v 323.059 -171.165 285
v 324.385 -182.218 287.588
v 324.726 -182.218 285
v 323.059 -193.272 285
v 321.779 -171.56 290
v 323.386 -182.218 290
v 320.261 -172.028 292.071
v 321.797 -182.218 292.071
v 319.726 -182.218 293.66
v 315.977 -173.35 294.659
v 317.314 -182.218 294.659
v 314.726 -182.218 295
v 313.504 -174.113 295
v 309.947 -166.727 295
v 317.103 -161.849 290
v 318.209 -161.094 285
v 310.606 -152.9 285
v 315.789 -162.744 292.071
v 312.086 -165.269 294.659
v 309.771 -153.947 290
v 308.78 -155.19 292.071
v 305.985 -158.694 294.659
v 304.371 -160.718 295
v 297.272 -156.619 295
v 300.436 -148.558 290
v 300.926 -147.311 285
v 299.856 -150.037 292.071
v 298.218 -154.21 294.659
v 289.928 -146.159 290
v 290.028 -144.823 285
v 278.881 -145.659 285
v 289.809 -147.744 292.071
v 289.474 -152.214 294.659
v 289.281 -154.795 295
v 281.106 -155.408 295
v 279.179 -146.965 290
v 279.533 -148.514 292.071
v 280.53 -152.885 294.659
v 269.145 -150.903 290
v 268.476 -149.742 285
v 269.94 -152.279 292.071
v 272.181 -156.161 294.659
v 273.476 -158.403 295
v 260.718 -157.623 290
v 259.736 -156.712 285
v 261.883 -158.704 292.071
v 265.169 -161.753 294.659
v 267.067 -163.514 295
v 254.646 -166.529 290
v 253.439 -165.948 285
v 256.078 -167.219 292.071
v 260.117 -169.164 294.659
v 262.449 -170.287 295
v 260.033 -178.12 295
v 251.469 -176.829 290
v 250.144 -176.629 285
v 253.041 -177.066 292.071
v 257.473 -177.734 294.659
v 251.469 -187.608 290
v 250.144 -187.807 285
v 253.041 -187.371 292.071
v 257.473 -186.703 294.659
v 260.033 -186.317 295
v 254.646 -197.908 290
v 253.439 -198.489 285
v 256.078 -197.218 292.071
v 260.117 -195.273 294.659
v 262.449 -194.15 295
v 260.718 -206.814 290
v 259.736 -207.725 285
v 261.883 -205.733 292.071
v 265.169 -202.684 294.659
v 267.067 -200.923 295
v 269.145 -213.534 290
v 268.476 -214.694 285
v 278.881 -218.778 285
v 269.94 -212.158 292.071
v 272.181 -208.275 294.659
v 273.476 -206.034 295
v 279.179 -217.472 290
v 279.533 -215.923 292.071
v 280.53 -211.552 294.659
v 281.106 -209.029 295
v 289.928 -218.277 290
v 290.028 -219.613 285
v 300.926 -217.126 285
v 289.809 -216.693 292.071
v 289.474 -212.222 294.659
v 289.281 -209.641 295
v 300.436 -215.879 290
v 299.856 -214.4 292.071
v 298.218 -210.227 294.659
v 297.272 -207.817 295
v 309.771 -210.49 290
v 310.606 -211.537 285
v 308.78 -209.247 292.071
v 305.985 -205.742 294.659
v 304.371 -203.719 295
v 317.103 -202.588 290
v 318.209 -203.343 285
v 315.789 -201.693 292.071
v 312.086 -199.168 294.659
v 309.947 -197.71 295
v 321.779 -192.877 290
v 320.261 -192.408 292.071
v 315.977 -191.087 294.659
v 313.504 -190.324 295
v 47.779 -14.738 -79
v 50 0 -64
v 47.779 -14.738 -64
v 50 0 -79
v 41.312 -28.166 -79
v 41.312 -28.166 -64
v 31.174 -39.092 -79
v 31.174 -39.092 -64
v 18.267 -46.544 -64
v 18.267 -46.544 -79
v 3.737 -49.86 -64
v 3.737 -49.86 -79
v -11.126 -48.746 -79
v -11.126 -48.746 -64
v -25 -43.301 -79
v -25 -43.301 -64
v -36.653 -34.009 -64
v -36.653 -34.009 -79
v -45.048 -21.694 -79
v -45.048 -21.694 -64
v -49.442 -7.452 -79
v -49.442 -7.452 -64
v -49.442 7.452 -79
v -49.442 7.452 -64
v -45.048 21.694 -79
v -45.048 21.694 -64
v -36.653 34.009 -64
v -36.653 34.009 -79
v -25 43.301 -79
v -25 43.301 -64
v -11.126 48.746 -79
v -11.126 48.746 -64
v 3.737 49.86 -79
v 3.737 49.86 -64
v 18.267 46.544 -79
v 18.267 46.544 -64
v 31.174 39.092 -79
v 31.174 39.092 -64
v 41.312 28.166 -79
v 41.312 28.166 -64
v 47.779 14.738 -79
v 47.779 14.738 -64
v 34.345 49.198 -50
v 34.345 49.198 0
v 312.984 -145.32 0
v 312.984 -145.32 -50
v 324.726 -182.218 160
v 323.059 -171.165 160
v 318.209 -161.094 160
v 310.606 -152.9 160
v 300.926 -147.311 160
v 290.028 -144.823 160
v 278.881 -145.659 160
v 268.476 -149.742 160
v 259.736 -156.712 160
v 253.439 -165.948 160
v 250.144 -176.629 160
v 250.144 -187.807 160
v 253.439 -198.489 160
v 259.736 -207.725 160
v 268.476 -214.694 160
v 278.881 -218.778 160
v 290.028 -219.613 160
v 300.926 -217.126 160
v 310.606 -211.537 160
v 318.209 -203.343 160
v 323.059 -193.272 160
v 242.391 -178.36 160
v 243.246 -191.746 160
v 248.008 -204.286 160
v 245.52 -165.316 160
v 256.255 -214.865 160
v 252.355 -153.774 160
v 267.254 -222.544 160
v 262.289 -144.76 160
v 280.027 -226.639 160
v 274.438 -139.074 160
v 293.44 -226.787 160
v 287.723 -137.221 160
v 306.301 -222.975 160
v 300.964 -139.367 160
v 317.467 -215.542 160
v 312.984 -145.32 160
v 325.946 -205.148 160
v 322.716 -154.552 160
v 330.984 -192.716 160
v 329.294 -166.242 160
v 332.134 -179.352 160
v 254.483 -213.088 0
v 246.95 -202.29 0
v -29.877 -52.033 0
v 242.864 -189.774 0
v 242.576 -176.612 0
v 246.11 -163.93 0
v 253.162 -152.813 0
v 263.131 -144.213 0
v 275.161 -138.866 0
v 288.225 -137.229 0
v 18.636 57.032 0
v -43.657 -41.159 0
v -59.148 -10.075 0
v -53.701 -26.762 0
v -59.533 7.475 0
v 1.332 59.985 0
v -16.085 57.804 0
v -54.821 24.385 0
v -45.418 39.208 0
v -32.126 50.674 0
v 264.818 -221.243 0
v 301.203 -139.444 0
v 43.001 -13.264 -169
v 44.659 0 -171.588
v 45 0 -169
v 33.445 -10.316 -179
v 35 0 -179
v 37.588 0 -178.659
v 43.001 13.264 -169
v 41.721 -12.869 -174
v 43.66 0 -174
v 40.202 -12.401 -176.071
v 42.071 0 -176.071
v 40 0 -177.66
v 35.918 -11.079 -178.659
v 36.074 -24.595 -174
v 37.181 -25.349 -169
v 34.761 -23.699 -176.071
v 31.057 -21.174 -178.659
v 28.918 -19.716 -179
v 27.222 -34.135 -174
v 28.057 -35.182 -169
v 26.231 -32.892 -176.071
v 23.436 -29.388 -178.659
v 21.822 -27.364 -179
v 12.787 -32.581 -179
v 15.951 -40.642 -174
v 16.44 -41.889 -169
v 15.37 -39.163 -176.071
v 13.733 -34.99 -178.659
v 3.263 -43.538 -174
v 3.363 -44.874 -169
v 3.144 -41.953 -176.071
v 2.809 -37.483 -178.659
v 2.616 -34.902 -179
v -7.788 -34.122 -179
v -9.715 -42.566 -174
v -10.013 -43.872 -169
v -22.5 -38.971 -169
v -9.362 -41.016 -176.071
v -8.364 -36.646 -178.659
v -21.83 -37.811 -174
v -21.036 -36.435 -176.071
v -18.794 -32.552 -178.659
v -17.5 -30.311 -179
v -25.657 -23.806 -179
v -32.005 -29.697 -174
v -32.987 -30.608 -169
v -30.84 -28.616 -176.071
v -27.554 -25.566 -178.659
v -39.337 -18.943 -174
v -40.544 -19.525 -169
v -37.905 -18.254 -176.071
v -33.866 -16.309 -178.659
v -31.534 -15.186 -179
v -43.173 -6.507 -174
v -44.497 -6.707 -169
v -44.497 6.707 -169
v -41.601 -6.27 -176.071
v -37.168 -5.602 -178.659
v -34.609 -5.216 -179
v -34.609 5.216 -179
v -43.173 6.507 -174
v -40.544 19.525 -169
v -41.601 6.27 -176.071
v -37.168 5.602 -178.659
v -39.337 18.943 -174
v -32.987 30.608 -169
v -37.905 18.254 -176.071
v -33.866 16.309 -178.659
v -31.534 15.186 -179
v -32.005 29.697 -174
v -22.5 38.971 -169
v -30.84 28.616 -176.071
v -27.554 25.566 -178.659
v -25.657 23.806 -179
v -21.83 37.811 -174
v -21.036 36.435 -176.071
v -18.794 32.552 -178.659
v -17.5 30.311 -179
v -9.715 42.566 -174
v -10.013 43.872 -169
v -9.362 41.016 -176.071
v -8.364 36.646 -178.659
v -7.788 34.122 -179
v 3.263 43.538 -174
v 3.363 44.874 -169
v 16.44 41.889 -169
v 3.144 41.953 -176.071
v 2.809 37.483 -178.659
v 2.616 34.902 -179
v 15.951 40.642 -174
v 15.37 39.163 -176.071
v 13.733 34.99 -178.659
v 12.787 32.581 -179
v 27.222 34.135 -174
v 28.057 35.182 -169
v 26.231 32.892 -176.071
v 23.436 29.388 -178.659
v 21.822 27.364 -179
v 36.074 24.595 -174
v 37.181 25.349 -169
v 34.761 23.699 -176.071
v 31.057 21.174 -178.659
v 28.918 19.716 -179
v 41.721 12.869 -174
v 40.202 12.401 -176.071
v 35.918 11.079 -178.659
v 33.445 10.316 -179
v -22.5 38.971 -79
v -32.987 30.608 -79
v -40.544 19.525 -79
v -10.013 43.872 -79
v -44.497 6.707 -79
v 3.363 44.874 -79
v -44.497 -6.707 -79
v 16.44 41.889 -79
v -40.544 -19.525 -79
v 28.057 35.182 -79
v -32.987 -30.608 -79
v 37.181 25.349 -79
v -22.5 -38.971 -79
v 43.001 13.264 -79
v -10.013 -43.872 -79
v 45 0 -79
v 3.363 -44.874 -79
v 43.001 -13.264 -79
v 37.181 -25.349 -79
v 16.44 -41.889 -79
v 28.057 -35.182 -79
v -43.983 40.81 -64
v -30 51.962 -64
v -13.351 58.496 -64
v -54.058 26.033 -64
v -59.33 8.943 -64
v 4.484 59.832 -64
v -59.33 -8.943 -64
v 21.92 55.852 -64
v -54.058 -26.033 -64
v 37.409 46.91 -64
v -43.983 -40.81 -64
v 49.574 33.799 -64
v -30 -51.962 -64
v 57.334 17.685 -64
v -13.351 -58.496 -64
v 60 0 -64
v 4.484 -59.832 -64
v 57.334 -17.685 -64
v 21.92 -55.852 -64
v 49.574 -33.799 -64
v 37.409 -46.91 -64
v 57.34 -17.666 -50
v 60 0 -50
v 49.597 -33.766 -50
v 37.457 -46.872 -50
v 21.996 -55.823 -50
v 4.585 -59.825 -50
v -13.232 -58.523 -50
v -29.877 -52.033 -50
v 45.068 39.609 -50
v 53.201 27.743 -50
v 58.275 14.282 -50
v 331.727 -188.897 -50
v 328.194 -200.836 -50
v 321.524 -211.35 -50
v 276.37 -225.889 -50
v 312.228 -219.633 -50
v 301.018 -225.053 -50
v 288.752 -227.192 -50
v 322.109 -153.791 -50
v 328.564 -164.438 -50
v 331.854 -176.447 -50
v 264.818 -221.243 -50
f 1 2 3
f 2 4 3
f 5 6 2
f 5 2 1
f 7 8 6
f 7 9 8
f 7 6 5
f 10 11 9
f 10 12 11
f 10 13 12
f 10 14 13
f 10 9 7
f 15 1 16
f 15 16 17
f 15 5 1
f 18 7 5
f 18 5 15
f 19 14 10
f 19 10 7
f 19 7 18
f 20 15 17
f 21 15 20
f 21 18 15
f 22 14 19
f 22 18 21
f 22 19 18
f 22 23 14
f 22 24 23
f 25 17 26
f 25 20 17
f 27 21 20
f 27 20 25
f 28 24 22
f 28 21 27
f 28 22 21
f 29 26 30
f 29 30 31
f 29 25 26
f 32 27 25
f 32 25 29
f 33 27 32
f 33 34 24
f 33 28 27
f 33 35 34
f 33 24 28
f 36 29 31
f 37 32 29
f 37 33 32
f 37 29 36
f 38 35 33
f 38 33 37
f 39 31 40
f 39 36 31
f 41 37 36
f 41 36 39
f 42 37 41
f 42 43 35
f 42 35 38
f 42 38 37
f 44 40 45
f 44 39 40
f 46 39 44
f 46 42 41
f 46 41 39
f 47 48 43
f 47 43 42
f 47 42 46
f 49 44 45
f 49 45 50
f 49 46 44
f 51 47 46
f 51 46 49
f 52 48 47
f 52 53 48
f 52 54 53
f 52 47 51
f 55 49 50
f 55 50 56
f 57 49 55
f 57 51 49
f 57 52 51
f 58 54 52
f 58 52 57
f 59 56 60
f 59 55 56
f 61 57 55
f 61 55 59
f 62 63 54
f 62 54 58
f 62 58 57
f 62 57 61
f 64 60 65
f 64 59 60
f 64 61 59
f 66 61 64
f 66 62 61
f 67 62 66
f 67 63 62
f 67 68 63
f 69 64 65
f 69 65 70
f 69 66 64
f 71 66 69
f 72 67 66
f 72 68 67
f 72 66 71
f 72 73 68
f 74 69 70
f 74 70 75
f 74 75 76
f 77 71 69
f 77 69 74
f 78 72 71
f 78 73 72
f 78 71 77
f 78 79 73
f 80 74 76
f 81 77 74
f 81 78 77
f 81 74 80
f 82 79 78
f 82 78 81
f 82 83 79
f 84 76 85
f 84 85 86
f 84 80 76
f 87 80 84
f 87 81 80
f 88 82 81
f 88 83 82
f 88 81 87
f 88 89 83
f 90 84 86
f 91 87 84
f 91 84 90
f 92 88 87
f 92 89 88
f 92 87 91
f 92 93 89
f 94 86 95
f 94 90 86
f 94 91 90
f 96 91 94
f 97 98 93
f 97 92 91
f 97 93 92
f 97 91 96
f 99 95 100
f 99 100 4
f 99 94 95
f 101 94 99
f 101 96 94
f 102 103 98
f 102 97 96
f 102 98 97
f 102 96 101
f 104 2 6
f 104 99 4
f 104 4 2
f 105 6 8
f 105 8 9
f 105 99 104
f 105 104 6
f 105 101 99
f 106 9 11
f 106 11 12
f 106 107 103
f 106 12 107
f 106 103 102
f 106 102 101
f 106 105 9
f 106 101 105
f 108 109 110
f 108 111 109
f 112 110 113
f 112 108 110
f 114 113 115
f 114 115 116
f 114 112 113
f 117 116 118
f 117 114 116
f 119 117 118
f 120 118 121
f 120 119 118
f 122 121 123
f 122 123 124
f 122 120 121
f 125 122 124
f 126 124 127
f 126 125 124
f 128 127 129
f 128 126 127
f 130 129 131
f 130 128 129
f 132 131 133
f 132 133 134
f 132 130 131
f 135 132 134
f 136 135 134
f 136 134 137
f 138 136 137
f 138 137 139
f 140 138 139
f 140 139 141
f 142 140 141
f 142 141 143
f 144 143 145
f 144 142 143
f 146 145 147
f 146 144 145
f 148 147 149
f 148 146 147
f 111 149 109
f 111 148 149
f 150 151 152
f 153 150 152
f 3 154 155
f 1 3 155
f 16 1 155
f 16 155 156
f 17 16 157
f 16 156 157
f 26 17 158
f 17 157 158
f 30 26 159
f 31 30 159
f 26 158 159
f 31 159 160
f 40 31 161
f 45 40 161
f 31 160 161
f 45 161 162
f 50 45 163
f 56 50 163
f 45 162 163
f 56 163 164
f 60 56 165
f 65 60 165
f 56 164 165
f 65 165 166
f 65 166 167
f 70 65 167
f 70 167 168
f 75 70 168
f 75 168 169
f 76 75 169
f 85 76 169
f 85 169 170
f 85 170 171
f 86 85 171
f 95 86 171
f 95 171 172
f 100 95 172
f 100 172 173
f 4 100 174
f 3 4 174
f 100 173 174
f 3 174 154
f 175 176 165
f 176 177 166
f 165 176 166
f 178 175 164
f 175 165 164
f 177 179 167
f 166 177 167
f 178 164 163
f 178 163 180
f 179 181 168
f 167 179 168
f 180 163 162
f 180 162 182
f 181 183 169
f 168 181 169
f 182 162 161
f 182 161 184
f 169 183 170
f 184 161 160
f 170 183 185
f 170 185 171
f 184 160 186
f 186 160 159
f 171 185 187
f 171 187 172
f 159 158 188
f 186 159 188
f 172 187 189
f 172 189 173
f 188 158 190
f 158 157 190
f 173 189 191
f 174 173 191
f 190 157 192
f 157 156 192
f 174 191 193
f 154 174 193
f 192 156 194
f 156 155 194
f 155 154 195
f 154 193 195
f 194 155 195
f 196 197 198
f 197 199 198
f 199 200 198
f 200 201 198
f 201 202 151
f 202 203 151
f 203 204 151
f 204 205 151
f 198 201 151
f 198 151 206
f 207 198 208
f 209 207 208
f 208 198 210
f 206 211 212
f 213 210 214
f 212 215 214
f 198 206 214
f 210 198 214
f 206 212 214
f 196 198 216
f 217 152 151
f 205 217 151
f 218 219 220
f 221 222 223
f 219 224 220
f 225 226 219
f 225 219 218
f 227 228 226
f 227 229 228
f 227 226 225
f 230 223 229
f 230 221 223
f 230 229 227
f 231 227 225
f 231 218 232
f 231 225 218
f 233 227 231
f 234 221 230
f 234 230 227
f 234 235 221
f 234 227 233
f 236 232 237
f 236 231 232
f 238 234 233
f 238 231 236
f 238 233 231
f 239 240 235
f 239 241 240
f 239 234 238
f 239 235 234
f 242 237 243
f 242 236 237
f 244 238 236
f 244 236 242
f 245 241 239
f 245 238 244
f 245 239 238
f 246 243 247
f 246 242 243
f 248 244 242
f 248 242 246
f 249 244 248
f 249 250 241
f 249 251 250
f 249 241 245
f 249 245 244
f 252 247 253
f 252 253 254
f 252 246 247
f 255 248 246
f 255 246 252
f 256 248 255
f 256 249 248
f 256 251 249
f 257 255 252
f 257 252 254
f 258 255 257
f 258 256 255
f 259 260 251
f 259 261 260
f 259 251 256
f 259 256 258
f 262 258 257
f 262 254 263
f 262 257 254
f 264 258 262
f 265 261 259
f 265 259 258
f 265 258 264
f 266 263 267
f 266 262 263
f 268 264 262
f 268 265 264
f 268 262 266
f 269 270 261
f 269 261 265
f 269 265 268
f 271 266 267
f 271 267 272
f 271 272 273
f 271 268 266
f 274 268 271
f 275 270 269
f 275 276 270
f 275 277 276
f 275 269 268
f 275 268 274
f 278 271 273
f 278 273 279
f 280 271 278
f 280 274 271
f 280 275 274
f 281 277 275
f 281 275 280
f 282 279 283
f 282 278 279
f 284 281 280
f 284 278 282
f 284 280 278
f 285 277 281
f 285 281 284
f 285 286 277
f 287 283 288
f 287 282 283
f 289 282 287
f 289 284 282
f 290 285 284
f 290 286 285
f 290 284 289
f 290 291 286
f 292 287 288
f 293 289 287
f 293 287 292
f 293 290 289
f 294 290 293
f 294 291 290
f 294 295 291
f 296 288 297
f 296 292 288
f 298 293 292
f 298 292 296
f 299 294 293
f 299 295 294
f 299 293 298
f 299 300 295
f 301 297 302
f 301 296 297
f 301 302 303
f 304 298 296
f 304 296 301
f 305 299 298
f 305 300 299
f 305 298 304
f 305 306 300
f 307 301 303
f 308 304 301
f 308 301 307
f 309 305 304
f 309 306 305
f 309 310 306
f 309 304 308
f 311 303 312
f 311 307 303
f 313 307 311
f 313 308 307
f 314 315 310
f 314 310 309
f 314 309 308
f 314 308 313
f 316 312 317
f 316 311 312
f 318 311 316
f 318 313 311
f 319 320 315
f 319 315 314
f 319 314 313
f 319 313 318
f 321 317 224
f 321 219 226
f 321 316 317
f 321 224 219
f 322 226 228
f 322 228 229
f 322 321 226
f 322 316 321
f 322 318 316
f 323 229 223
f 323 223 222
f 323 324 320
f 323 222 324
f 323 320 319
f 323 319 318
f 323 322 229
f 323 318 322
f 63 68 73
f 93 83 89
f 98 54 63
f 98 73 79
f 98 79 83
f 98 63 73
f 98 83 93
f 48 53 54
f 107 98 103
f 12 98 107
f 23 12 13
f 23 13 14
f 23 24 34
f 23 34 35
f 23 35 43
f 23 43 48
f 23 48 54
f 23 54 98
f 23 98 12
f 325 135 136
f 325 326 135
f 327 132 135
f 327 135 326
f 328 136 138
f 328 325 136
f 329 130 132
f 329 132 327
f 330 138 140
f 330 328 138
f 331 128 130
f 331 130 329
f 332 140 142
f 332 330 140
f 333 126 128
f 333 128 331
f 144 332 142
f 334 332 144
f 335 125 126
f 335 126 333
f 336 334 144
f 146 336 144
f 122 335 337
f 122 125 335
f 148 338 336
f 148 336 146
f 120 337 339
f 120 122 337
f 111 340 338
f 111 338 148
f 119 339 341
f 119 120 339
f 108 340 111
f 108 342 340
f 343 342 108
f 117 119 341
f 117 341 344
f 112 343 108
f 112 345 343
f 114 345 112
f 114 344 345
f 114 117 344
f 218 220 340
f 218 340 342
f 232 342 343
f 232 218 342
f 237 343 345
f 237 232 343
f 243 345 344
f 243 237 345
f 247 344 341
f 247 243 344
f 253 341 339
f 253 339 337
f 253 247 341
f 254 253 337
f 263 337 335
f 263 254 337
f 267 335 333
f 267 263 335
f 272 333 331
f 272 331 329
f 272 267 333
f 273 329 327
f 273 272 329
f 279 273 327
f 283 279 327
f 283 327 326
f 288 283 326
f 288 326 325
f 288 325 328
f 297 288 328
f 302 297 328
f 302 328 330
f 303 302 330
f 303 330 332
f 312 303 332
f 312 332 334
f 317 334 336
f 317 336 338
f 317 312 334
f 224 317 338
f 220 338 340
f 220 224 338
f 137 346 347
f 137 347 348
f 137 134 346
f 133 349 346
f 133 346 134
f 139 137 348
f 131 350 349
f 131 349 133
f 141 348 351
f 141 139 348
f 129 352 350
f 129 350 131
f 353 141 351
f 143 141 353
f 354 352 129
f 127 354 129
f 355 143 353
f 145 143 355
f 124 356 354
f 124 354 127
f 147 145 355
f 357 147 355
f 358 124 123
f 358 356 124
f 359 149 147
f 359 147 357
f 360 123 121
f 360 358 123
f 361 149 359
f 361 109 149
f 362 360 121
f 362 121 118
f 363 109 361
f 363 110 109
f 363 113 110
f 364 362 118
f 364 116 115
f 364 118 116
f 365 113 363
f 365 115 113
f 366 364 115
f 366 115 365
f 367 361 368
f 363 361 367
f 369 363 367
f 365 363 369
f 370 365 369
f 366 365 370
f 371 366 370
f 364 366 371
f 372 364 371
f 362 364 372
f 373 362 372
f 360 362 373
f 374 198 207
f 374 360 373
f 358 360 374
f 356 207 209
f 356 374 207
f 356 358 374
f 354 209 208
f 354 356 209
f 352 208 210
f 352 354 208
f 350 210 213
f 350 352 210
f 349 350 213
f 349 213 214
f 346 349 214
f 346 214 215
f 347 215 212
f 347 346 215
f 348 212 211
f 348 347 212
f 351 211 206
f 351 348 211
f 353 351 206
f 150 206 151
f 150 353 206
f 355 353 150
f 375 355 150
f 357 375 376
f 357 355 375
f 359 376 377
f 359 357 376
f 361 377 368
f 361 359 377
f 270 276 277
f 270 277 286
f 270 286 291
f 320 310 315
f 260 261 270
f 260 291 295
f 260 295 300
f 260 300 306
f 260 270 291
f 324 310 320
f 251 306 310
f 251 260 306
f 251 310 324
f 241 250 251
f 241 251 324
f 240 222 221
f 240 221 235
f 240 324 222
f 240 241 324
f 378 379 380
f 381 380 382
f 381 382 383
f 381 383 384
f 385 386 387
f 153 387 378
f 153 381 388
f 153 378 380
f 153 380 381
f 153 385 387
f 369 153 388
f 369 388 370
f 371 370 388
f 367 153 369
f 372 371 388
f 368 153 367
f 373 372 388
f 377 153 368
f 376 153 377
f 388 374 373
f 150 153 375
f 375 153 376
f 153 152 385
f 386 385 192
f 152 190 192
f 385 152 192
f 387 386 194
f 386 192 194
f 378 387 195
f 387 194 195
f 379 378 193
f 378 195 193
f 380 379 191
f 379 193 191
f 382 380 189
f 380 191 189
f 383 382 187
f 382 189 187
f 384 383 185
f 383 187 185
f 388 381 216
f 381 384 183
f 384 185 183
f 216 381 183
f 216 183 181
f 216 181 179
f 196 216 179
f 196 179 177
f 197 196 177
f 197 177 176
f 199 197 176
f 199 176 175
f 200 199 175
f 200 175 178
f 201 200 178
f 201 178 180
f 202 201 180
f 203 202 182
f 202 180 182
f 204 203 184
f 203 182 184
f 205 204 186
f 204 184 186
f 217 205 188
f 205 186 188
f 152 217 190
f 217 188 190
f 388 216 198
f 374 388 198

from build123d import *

# Parameters (mm, degrees)
Y_KSEKLIK_EKSTR_ZYON2_DEPTH = 50
IZIM3_R                     = 45
Y_KSEKLIK_EKSTR_ZYON3_DEPTH = 210
IZIM4_R                     = 37.5
Y_KSEKLIK_EKSTR_ZYON4_DEPTH = 135
RADYUS1_R                   = 10


with BuildPart() as part:
    # Çizim1 → Döndür1 (revolve)
    with BuildSketch(Plane(origin=(0, 0, 0), x_dir=(0, 0, -1), z_dir=(1, 0, 0)), mode=Mode.PRIVATE) as d_nd_r1_sk:
        Polygon((0, 0), (0, 60), (64, 60), (64, 50), (79, 50), (79, 45), (179, 45), (179, 0), align=None)
    revolve(d_nd_r1_sk.sketch.rotate(Axis((0, 0, 55.580802483), (0, 0, -1)), 90), axis=Axis((0, 0, 55.580802483), (0, 0, -1)))

    # Çizim2 → Yükseklik-Ekstrüzyon2 (add)
    with BuildSketch(Plane.XY):
        with BuildLine():
            Line((34.344942753, 49.19781405), (312.984226436, -145.319979709))
            ThreePointArc((312.984226436, -145.319979709), (325.22389765, -206.324838294), (264.818131867, -221.242806741))
            Line((264.818131867, -221.242806741), (-29.876516673, -52.032621993))
            Line((-29.876516673, -52.032621993), (34.344942753, 49.19781405))
        make_face()
    extrude(amount=-Y_KSEKLIK_EKSTR_ZYON2_DEPTH)

    # Çizim3 → Yükseklik-Ekstrüzyon3 (add)
    with BuildSketch(Plane(origin=(0, 0, -50), x_dir=(-1, 0, 0), z_dir=(0, 0, -1))):
        with Locations(Location((-287.225519371, -182.218340246, 0), (0, 0, 124.918853114))):
            Circle(IZIM3_R)
    extrude(amount=-Y_KSEKLIK_EKSTR_ZYON3_DEPTH)

    # Çizim4 → Yükseklik-Ekstrüzyon4 (add)
    with BuildSketch(Plane.XY.offset(160)):
        with Locations((287.225519371, -182.218340246)):
            Circle(IZIM4_R)
    extrude(amount=Y_KSEKLIK_EKSTR_ZYON4_DEPTH)

    # Radyus1
    radyus1_edges = [part.edges().sort_by_distance(p)[0] for p in [
        (249.725519371, -182.218340246, 295),
        (-45, 0, -179),
    ]]
    fillet(radyus1_edges, radius=RADYUS1_R)


solid = part.part
